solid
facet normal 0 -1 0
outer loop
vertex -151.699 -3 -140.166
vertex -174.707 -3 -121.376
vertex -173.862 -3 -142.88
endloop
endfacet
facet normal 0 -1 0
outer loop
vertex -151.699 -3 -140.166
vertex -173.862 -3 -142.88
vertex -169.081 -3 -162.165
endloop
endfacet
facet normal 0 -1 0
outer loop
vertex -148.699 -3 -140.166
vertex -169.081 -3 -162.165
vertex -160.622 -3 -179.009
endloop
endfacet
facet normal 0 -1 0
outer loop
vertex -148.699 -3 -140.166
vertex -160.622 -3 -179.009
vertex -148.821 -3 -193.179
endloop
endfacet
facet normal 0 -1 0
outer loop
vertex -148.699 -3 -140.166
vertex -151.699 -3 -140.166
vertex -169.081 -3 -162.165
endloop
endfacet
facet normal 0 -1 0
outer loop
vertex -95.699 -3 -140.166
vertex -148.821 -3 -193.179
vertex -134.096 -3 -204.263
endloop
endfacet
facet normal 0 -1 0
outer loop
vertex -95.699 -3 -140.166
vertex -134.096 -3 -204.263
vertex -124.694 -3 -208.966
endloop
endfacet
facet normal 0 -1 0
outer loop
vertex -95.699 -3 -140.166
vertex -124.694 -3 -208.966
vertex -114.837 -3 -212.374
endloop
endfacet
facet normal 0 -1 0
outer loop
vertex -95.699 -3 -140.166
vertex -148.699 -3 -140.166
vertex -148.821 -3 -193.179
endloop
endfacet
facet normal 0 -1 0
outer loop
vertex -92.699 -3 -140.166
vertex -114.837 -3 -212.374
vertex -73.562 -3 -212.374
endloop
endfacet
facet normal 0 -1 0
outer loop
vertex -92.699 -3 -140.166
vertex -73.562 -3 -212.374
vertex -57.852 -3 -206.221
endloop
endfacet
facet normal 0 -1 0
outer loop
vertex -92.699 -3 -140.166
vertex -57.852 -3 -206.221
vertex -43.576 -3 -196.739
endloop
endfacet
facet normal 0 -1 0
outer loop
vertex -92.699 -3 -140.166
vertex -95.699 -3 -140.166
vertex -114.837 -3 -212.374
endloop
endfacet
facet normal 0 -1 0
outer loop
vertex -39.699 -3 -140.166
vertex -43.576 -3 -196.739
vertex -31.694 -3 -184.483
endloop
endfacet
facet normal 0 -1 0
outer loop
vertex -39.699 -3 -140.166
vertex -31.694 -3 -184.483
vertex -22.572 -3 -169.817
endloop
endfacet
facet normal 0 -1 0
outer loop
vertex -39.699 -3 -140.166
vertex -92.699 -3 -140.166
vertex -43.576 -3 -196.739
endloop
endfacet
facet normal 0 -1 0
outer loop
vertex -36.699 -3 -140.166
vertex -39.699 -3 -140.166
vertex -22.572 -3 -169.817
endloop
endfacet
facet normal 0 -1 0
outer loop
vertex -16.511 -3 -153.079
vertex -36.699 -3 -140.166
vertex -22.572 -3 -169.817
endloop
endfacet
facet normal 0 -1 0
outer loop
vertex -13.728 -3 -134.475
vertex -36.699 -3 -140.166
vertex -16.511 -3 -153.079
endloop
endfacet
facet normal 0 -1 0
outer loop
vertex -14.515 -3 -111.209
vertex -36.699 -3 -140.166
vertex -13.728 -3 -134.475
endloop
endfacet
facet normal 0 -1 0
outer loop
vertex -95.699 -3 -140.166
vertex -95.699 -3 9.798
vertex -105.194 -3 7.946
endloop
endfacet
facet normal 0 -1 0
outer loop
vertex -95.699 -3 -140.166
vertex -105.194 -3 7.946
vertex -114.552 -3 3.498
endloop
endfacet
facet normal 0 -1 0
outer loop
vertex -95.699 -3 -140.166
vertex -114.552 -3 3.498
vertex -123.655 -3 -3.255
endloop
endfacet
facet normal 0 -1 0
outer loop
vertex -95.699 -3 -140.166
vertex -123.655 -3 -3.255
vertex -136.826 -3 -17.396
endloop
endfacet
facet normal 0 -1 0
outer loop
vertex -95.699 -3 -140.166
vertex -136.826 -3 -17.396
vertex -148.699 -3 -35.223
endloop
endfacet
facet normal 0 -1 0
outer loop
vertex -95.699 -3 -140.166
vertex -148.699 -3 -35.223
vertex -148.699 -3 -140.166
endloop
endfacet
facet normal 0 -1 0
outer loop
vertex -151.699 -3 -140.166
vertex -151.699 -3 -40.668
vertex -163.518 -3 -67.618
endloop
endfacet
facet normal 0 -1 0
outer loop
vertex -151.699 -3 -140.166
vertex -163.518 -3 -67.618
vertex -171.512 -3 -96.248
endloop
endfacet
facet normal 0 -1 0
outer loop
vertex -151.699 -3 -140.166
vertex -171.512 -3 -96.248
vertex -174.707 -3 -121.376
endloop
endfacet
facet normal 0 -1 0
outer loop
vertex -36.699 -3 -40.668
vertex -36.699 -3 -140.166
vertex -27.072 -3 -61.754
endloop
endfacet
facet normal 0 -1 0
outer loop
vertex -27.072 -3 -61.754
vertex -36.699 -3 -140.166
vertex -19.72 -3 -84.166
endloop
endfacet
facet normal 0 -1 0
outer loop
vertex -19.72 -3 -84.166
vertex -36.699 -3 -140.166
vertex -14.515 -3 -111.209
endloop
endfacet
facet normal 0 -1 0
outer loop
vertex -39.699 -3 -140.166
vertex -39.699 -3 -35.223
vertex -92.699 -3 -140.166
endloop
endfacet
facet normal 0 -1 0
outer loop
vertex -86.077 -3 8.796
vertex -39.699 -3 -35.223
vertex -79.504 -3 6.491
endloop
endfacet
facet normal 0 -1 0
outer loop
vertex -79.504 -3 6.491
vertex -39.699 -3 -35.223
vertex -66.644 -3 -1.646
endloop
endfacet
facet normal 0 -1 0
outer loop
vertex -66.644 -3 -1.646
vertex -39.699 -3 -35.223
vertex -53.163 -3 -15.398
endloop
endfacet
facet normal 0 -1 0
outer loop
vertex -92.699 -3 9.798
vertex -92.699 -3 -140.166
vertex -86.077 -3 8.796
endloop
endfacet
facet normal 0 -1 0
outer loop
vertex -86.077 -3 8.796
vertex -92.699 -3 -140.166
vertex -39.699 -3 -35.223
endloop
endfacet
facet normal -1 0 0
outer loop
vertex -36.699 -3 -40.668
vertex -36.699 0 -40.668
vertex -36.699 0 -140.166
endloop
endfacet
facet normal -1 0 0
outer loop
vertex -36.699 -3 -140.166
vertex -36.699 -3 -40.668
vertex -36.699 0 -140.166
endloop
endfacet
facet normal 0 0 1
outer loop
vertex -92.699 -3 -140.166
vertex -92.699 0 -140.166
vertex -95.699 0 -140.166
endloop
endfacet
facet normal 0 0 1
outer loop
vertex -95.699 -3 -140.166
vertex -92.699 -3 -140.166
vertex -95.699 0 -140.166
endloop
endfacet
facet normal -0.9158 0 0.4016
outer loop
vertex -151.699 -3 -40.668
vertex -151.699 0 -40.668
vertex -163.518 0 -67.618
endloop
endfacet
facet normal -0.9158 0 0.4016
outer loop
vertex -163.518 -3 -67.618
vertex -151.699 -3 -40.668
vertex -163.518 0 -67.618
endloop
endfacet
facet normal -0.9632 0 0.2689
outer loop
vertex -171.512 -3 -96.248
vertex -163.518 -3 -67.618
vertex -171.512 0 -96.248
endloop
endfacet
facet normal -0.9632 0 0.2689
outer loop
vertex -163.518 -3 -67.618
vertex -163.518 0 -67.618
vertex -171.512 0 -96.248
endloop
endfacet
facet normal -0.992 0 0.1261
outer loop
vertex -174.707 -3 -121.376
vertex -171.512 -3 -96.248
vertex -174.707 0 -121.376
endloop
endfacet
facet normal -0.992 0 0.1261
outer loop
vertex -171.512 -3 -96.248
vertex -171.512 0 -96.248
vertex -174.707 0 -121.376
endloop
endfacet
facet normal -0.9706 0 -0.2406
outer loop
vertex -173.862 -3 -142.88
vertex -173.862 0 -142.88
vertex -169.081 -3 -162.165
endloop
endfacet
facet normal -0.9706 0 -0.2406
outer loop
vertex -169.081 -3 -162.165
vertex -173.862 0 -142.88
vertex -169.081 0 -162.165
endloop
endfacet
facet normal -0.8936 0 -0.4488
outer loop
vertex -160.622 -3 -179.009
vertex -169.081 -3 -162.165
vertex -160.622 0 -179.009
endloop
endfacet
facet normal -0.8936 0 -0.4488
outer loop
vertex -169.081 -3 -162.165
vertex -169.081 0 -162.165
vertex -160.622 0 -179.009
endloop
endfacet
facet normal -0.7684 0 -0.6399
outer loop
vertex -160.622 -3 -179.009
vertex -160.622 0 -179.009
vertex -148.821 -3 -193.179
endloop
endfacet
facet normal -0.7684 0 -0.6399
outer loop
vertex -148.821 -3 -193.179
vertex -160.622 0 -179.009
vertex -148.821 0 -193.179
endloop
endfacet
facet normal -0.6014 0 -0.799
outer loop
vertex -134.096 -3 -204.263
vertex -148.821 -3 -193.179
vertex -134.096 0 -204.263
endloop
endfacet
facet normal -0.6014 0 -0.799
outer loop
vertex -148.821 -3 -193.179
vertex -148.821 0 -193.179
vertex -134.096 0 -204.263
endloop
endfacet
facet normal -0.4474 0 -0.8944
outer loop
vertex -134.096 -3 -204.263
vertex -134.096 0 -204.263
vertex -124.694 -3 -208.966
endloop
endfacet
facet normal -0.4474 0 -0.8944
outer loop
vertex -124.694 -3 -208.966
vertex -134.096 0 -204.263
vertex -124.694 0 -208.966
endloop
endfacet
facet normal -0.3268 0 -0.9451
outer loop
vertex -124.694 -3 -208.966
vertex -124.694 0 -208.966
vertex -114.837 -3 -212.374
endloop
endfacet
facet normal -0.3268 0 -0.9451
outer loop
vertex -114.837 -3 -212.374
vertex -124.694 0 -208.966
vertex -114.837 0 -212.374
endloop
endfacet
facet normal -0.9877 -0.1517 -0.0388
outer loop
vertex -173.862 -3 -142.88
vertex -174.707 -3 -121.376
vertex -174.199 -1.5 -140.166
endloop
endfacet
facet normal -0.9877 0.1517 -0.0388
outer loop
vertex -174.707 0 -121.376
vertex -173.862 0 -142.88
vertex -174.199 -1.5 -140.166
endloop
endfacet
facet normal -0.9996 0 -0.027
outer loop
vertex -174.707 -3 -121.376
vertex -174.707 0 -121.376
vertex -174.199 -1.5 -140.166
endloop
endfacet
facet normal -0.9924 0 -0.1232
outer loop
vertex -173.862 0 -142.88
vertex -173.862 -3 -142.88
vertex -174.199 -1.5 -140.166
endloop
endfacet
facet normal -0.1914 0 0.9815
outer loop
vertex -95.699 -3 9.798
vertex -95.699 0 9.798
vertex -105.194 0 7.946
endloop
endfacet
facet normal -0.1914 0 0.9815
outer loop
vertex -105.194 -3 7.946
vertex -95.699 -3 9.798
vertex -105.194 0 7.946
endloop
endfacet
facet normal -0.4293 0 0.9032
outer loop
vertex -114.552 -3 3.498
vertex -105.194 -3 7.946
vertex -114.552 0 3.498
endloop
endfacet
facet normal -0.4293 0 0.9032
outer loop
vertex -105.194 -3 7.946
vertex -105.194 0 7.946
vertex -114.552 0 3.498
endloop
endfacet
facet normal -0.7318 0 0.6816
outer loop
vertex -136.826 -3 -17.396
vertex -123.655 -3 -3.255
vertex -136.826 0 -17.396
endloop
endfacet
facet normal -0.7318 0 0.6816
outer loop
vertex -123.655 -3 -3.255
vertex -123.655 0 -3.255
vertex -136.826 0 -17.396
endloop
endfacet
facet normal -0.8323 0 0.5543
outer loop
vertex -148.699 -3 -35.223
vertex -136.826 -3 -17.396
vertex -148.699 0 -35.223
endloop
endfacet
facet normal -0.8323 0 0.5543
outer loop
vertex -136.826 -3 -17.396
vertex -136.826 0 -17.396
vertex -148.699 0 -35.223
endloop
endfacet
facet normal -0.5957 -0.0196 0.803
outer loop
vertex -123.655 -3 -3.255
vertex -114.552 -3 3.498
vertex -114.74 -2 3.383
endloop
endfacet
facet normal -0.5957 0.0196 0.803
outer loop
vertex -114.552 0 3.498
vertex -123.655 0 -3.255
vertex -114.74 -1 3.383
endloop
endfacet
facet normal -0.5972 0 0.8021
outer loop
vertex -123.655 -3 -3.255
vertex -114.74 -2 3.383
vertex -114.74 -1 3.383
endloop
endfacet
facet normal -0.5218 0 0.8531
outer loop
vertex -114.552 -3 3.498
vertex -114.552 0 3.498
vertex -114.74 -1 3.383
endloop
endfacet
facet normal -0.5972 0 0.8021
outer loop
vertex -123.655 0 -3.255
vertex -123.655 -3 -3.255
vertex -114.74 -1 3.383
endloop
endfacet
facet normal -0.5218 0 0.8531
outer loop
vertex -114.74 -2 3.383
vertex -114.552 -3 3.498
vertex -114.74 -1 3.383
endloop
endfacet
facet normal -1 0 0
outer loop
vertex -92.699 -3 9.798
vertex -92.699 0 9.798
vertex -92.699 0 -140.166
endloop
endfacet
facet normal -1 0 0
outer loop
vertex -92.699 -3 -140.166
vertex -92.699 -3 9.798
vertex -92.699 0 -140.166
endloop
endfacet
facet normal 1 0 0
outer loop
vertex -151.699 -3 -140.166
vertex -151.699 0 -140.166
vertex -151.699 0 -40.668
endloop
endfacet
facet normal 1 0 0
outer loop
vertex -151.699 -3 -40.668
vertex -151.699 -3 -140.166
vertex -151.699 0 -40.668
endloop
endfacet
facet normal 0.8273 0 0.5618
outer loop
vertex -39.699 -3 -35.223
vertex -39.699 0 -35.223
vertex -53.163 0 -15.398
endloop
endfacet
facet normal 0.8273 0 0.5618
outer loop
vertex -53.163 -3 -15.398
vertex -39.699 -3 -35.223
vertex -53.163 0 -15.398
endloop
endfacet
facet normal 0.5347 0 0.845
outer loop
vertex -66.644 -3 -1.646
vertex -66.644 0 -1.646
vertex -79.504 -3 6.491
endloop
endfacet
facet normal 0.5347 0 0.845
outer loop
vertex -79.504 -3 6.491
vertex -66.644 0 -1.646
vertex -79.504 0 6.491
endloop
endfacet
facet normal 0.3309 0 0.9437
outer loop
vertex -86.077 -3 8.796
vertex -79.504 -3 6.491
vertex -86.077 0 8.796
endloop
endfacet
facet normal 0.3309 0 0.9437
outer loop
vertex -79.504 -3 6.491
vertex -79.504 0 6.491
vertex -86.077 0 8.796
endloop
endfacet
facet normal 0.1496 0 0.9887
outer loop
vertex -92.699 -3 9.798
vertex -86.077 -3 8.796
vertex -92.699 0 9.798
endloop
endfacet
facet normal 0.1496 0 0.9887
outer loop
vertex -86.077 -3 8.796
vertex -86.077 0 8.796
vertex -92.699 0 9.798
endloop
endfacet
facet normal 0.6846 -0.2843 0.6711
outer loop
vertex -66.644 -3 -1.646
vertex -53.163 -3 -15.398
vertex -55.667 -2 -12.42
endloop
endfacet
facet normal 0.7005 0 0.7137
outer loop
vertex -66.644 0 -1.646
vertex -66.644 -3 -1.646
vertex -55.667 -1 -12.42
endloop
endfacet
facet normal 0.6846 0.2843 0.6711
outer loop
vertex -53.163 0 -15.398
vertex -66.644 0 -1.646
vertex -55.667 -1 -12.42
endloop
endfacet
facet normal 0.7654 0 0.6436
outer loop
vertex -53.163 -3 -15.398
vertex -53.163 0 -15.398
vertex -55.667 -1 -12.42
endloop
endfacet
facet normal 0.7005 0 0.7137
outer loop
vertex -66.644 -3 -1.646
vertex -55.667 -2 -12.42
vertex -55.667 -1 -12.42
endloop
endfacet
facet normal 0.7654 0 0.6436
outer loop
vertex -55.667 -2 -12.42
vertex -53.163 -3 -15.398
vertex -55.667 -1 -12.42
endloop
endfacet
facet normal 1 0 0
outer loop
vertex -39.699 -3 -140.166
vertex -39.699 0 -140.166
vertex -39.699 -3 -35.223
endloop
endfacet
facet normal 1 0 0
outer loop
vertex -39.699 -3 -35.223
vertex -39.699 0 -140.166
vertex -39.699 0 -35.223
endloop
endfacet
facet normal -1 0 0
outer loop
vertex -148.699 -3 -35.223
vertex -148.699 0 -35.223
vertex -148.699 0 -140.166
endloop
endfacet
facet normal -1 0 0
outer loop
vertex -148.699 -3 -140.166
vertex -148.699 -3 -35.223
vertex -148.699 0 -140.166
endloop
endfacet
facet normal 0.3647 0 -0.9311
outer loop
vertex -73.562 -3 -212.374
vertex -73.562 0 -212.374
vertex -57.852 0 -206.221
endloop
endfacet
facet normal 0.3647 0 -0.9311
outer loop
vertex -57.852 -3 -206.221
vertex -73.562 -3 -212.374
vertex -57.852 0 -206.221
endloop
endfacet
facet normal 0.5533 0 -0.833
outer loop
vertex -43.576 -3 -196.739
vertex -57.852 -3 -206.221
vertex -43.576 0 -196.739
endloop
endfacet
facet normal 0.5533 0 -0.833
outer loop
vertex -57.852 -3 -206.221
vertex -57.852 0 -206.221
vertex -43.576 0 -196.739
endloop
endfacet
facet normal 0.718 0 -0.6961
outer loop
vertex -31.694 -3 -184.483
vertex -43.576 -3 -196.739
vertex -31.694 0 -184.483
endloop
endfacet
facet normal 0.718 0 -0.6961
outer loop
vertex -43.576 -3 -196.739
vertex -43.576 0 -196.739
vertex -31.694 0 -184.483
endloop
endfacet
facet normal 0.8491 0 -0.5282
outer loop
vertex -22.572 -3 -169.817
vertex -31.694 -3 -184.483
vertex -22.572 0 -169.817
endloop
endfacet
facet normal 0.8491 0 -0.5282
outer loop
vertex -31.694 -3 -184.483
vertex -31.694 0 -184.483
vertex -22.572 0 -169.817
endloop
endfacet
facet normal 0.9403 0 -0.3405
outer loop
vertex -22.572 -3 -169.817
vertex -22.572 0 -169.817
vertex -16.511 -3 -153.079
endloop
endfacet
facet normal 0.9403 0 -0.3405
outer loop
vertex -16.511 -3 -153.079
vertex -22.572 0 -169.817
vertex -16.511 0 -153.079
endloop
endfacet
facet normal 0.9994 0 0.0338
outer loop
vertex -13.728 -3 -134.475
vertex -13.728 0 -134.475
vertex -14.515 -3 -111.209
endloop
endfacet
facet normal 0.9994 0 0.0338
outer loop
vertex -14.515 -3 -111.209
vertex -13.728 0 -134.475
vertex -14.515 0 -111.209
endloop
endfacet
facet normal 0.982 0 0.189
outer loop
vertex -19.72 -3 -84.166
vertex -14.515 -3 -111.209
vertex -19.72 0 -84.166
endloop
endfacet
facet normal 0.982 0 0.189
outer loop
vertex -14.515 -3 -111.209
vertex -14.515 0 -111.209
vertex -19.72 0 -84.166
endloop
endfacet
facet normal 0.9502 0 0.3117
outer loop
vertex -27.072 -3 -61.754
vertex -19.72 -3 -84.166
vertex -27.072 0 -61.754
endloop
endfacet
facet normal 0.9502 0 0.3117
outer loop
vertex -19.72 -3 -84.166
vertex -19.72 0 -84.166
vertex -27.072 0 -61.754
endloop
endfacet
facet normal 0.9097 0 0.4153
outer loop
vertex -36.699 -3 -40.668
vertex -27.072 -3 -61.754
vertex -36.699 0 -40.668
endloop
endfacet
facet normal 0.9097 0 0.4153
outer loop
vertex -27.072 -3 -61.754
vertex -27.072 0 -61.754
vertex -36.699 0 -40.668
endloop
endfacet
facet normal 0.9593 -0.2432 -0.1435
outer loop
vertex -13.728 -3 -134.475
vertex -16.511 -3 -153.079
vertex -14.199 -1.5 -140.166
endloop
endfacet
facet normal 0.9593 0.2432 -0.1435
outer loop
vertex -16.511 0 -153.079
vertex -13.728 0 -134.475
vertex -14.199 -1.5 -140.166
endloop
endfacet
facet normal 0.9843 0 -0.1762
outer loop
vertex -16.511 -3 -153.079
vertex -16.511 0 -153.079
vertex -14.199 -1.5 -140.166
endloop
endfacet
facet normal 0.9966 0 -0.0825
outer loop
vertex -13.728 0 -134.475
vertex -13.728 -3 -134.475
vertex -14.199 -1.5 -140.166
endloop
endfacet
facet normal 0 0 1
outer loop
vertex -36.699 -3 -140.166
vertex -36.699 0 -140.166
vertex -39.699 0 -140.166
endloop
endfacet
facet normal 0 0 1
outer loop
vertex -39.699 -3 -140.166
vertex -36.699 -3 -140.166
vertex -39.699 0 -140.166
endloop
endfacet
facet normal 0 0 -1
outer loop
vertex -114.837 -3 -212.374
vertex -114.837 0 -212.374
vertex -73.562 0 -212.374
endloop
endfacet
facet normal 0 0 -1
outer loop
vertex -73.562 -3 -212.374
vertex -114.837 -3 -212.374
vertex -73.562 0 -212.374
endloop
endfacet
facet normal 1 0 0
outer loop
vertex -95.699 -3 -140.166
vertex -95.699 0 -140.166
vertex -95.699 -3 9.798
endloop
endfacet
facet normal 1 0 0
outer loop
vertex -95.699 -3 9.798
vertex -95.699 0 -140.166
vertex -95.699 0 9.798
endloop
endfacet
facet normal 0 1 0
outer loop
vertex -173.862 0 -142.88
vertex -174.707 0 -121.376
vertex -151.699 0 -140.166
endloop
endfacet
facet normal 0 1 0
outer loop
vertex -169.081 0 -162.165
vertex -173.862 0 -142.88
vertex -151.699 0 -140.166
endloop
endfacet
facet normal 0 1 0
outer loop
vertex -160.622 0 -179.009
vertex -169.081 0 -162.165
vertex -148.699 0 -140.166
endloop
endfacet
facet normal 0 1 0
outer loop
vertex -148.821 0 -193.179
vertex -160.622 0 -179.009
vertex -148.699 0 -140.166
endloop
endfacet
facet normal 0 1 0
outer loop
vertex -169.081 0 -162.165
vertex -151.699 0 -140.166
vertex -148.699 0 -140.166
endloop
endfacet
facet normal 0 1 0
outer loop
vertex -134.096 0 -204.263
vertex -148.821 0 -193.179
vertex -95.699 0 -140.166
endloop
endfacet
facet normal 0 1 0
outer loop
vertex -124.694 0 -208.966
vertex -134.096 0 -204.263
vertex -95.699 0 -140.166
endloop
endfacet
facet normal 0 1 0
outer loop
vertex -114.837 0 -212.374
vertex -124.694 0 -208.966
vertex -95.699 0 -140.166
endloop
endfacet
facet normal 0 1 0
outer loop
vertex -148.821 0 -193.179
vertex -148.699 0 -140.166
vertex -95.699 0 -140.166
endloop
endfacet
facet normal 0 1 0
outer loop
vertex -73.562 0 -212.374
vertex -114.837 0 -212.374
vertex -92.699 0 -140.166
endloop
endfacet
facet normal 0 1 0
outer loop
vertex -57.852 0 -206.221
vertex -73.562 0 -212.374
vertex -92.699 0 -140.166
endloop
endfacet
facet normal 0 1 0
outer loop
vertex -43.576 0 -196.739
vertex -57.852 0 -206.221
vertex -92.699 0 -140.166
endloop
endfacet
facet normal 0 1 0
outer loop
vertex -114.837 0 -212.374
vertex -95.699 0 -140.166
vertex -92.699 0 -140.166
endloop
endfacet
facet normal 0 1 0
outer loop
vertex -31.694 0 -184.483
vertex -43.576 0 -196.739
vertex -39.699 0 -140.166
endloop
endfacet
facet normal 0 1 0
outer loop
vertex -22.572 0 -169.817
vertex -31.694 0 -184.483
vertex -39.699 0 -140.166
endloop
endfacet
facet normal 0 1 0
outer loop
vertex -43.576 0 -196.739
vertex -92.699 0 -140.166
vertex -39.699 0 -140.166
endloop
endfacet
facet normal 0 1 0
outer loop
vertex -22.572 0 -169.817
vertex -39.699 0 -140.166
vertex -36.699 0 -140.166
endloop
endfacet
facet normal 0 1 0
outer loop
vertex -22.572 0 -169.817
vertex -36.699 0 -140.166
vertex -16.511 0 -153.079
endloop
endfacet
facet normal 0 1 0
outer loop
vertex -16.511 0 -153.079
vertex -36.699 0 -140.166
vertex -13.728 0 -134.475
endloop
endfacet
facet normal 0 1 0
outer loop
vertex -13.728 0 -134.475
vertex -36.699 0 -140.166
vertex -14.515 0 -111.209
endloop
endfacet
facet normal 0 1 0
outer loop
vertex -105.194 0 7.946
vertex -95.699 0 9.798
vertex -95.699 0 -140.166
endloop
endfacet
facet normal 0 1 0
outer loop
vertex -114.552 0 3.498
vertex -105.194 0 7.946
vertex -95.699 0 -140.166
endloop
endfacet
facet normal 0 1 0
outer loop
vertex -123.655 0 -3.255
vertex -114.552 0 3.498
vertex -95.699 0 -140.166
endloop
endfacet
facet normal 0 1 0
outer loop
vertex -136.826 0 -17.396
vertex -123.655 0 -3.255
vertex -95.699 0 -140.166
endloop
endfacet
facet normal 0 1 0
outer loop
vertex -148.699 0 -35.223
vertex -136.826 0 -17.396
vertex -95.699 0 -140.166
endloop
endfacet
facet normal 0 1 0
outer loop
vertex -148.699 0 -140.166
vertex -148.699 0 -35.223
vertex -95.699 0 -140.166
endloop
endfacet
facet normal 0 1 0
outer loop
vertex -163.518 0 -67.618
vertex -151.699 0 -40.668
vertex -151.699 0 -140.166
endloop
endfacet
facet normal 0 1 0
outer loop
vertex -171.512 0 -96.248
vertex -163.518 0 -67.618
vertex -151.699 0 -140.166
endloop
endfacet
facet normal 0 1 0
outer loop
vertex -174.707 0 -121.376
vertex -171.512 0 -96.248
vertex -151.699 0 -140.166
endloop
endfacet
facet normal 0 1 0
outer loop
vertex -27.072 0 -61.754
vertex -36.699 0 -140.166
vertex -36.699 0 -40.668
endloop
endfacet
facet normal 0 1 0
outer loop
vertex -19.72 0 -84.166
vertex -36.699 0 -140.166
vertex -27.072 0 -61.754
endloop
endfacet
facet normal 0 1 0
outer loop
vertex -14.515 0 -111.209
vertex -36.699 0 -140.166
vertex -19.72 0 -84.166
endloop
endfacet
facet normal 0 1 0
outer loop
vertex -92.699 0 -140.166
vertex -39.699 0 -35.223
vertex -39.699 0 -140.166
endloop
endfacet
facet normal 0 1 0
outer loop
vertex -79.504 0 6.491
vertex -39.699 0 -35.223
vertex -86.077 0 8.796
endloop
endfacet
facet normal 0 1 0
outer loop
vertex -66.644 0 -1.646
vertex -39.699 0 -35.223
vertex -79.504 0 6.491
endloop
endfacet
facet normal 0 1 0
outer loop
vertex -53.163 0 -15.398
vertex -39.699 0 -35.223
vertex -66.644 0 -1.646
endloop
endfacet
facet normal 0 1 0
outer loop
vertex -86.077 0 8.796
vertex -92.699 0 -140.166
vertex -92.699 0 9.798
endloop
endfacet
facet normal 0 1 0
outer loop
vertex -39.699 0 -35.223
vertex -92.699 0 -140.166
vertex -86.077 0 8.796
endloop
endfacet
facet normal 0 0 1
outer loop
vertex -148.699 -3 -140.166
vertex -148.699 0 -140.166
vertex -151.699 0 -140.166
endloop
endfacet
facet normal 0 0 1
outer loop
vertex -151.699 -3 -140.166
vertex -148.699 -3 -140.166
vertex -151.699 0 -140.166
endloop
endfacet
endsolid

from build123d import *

# Parameters (mm, degrees)
F1_DEPTH = 3


# Not quite as in the source:
# - a feature names something its author has since deleted; it is built from what else it names


with BuildPart() as f1:
    # F0 (on Front) → F1 (new body)
    with BuildSketch(Plane.XZ):
        with BuildLine():
            Line((-95.6991912493, -140.1659290001), (-95.6991912493, 9.7979199733))
            add(Edge.make_bspline(
                [(-95.6991912493, 9.7979199733), (-114.9403248651, 8.8727934734), (-134.0676037648, -9.7150772734), (-148.6991912496, -35.2231978093)],
                knots=[0.0032045269, 0.0032045269, 0.0032045269, 0.0032045269, 0.1265346274, 0.1265346274, 0.1265346274, 0.1265346274], degree=3))
            Line((-148.6991912496, -35.2231978093), (-148.6991912415, -140.1659290001))
            Line((-148.6991912415, -140.1659290001), (-151.6991912415, -140.1659290001))
            Line((-151.6991912415, -140.1659290001), (-151.6991912492, -40.6684138407))
            add(Edge.make_bspline(
                [(-151.6991912492, -40.6684138407), (-167.8134864464, -71.1210787155), (-189.9683027369, -159.0658708259), (-144.3602498784, -204.2889070632), (-114.8366912492, -212.3738275092)],
                knots=[0.135152904, 0.135152904, 0.135152904, 0.135152904, 0.2772924741, 0.4585993514, 0.4585993514, 0.4585993514, 0.4585993514], degree=3))
            Line((-114.8366912492, -212.3738275092), (-73.5616912492, -212.3738275092))
            add(Edge.make_bspline(
                [(-73.5616912492, -212.3738275092), (-44.03813262, -204.2889070632), (1.5699202449, -159.0658708196), (-20.5848960581, -71.1210786912), (-36.6991912644, -40.6684138119)],
                knots=[0.5414006486, 0.5414006486, 0.5414006486, 0.5414006486, 0.7227075259, 0.8648470961, 0.8648470961, 0.8648470961, 0.8648470961], degree=3))
            Line((-36.6991912644, -40.6684138119), (-36.6991912645, -140.1659290001))
            Line((-36.6991912645, -140.1659290001), (-39.6991912645, -140.1659290001))
            Line((-39.6991912645, -140.1659290001), (-39.6991912644, -35.223197782))
            add(Edge.make_bspline(
                [(-39.6991912644, -35.223197782), (-54.3307787472, -9.71507726), (-73.4580576403, 8.8727934739), (-92.6991912493, 9.7979199734)],
                knots=[0.8734653727, 0.8734653727, 0.8734653727, 0.8734653727, 0.9967954731, 0.9967954731, 0.9967954731, 0.9967954731], degree=3))
            Line((-92.6991912493, 9.7979199734), (-92.6991912493, -140.1659290001))
            Line((-92.6991912493, -140.1659290001), (-95.6991912493, -140.1659290001))
        make_face()
    extrude(amount=F1_DEPTH)


solid = f1.part
